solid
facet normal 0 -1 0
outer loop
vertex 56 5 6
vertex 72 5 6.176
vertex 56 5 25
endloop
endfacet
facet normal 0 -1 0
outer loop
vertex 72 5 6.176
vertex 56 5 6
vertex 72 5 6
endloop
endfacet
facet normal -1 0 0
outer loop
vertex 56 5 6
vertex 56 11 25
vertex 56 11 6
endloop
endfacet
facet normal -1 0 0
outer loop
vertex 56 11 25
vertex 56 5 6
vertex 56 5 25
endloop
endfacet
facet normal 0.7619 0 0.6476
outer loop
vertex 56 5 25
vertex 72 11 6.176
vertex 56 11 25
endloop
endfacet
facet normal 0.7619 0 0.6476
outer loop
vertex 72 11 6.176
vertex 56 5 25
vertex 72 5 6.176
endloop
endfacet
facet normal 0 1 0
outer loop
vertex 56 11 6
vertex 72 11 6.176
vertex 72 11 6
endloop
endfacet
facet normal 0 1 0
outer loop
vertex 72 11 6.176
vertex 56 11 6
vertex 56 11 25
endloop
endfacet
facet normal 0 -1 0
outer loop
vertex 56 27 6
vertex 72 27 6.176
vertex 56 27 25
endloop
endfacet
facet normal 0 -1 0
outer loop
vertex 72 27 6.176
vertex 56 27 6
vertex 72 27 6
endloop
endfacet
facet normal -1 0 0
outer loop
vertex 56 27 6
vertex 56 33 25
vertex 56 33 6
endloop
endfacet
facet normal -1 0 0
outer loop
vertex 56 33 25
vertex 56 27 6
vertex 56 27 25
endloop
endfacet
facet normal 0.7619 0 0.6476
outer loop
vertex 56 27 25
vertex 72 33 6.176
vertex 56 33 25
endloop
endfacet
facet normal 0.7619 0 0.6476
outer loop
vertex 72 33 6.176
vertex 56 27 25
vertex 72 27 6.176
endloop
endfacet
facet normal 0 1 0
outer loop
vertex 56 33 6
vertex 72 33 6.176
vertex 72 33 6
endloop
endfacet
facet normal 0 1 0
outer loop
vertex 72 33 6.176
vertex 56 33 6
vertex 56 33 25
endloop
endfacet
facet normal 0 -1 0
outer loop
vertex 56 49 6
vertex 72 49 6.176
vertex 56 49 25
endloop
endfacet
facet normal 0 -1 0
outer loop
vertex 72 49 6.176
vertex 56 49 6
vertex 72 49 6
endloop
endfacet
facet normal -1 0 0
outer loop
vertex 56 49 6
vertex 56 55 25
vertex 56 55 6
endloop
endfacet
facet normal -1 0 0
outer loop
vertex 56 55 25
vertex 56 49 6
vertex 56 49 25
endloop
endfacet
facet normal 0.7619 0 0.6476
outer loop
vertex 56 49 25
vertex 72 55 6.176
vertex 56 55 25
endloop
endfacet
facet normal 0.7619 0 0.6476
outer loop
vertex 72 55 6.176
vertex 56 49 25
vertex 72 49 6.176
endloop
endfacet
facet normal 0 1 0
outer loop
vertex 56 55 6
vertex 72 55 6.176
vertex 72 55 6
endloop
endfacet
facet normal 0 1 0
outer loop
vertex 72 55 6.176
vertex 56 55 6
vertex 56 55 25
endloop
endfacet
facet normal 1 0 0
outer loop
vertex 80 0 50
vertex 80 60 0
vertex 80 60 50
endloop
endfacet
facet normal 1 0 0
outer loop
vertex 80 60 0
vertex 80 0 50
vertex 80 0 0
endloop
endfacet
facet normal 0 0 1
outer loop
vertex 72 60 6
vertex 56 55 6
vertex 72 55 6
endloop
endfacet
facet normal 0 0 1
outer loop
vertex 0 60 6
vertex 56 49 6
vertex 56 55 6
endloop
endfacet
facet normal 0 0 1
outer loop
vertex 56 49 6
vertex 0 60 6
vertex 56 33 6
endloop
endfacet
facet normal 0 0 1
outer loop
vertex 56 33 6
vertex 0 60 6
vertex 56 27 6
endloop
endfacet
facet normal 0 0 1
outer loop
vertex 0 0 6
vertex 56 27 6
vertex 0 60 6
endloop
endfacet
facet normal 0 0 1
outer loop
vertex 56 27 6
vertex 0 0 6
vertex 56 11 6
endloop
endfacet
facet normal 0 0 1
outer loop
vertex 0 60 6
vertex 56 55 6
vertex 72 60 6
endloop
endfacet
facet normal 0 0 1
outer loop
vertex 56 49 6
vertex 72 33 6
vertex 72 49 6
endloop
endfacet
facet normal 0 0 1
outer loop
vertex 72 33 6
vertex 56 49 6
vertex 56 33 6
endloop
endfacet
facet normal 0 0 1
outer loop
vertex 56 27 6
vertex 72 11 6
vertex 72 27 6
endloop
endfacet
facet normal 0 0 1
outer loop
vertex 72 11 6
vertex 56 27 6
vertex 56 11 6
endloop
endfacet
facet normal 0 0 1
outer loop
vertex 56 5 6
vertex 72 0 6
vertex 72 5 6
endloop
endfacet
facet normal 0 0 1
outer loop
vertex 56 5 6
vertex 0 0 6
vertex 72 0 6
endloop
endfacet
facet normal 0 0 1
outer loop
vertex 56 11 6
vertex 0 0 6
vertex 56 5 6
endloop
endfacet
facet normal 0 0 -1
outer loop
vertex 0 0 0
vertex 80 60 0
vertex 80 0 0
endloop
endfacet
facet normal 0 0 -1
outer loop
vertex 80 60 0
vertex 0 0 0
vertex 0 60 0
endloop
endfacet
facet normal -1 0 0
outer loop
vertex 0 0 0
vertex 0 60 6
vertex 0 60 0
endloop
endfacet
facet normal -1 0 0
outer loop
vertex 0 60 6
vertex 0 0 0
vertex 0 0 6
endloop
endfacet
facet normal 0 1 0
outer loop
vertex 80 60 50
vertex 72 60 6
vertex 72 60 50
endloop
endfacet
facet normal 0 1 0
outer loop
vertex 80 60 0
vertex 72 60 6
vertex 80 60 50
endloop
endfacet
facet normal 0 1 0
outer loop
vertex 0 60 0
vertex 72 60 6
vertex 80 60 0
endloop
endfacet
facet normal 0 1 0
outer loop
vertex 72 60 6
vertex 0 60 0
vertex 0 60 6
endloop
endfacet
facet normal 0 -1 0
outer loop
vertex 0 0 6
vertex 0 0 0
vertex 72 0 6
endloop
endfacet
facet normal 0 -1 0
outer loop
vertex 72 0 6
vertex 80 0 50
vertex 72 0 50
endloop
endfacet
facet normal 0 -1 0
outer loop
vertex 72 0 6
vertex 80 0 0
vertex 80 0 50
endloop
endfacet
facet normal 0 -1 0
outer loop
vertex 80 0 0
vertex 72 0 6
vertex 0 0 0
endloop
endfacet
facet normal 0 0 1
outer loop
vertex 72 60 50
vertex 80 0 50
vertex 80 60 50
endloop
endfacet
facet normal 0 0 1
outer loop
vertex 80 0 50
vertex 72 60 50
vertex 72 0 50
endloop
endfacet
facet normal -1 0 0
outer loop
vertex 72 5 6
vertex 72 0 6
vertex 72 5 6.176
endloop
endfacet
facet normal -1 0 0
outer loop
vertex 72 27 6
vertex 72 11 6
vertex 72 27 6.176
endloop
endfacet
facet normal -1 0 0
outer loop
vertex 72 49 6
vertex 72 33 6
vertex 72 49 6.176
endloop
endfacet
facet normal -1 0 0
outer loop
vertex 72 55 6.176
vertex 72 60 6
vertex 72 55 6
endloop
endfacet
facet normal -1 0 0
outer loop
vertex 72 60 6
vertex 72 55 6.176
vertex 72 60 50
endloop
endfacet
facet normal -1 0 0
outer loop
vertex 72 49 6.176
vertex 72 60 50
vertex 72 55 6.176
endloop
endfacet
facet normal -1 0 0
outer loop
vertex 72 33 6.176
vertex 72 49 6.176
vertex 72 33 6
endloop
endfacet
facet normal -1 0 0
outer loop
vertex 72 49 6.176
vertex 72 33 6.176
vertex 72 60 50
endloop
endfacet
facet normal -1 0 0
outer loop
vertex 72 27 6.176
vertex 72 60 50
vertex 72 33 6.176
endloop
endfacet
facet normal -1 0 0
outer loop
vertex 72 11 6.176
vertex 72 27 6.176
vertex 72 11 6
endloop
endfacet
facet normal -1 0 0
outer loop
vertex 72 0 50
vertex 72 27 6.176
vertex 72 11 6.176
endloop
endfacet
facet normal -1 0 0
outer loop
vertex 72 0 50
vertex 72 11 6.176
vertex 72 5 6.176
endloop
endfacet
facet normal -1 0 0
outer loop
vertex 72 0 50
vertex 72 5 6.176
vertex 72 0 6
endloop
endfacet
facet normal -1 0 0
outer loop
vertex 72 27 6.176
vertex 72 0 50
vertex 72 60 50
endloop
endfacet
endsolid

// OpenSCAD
$fn = 32;

// ----------------------------------------------------------------------
// Rib bracket: 3-gusset L bracket
// ----------------------------------------------------------------------

// --- parameters (mm) ---
base_l = 80;              // foot length, X
base_w = 60;              // foot width, Y
base_t = 6;               // foot thickness
plate_t = 8;              // upright plate thickness
plate_h = 50;             // overall height
gus_l = 16;               // gusset leg along the foot
gus_h = 20;               // gusset height
gus_t = 6;                // gusset thickness
gus_edge = 5;             // gusset margin from the foot edge
n_gus = 3;                // gusset count

gus_pitch = (base_w - 2 * gus_edge - gus_t) / (n_gus - 1);  // gusset pitch

union() {
  cube([base_l, base_w, base_t]);
  translate([base_l - plate_t, 0, base_t - 1])
    cube([plate_t, base_w, plate_h - base_t + 1]);
  for (i = [0 : n_gus - 1])
    translate([base_l - plate_t - gus_l, gus_edge + i * gus_pitch, base_t - 1])
      rotate([-90, 0, 0])
        linear_extrude(height = gus_t)
          polygon(points = [[0, 0], [gus_l + 1, 0], [0, -gus_h]]);
}
